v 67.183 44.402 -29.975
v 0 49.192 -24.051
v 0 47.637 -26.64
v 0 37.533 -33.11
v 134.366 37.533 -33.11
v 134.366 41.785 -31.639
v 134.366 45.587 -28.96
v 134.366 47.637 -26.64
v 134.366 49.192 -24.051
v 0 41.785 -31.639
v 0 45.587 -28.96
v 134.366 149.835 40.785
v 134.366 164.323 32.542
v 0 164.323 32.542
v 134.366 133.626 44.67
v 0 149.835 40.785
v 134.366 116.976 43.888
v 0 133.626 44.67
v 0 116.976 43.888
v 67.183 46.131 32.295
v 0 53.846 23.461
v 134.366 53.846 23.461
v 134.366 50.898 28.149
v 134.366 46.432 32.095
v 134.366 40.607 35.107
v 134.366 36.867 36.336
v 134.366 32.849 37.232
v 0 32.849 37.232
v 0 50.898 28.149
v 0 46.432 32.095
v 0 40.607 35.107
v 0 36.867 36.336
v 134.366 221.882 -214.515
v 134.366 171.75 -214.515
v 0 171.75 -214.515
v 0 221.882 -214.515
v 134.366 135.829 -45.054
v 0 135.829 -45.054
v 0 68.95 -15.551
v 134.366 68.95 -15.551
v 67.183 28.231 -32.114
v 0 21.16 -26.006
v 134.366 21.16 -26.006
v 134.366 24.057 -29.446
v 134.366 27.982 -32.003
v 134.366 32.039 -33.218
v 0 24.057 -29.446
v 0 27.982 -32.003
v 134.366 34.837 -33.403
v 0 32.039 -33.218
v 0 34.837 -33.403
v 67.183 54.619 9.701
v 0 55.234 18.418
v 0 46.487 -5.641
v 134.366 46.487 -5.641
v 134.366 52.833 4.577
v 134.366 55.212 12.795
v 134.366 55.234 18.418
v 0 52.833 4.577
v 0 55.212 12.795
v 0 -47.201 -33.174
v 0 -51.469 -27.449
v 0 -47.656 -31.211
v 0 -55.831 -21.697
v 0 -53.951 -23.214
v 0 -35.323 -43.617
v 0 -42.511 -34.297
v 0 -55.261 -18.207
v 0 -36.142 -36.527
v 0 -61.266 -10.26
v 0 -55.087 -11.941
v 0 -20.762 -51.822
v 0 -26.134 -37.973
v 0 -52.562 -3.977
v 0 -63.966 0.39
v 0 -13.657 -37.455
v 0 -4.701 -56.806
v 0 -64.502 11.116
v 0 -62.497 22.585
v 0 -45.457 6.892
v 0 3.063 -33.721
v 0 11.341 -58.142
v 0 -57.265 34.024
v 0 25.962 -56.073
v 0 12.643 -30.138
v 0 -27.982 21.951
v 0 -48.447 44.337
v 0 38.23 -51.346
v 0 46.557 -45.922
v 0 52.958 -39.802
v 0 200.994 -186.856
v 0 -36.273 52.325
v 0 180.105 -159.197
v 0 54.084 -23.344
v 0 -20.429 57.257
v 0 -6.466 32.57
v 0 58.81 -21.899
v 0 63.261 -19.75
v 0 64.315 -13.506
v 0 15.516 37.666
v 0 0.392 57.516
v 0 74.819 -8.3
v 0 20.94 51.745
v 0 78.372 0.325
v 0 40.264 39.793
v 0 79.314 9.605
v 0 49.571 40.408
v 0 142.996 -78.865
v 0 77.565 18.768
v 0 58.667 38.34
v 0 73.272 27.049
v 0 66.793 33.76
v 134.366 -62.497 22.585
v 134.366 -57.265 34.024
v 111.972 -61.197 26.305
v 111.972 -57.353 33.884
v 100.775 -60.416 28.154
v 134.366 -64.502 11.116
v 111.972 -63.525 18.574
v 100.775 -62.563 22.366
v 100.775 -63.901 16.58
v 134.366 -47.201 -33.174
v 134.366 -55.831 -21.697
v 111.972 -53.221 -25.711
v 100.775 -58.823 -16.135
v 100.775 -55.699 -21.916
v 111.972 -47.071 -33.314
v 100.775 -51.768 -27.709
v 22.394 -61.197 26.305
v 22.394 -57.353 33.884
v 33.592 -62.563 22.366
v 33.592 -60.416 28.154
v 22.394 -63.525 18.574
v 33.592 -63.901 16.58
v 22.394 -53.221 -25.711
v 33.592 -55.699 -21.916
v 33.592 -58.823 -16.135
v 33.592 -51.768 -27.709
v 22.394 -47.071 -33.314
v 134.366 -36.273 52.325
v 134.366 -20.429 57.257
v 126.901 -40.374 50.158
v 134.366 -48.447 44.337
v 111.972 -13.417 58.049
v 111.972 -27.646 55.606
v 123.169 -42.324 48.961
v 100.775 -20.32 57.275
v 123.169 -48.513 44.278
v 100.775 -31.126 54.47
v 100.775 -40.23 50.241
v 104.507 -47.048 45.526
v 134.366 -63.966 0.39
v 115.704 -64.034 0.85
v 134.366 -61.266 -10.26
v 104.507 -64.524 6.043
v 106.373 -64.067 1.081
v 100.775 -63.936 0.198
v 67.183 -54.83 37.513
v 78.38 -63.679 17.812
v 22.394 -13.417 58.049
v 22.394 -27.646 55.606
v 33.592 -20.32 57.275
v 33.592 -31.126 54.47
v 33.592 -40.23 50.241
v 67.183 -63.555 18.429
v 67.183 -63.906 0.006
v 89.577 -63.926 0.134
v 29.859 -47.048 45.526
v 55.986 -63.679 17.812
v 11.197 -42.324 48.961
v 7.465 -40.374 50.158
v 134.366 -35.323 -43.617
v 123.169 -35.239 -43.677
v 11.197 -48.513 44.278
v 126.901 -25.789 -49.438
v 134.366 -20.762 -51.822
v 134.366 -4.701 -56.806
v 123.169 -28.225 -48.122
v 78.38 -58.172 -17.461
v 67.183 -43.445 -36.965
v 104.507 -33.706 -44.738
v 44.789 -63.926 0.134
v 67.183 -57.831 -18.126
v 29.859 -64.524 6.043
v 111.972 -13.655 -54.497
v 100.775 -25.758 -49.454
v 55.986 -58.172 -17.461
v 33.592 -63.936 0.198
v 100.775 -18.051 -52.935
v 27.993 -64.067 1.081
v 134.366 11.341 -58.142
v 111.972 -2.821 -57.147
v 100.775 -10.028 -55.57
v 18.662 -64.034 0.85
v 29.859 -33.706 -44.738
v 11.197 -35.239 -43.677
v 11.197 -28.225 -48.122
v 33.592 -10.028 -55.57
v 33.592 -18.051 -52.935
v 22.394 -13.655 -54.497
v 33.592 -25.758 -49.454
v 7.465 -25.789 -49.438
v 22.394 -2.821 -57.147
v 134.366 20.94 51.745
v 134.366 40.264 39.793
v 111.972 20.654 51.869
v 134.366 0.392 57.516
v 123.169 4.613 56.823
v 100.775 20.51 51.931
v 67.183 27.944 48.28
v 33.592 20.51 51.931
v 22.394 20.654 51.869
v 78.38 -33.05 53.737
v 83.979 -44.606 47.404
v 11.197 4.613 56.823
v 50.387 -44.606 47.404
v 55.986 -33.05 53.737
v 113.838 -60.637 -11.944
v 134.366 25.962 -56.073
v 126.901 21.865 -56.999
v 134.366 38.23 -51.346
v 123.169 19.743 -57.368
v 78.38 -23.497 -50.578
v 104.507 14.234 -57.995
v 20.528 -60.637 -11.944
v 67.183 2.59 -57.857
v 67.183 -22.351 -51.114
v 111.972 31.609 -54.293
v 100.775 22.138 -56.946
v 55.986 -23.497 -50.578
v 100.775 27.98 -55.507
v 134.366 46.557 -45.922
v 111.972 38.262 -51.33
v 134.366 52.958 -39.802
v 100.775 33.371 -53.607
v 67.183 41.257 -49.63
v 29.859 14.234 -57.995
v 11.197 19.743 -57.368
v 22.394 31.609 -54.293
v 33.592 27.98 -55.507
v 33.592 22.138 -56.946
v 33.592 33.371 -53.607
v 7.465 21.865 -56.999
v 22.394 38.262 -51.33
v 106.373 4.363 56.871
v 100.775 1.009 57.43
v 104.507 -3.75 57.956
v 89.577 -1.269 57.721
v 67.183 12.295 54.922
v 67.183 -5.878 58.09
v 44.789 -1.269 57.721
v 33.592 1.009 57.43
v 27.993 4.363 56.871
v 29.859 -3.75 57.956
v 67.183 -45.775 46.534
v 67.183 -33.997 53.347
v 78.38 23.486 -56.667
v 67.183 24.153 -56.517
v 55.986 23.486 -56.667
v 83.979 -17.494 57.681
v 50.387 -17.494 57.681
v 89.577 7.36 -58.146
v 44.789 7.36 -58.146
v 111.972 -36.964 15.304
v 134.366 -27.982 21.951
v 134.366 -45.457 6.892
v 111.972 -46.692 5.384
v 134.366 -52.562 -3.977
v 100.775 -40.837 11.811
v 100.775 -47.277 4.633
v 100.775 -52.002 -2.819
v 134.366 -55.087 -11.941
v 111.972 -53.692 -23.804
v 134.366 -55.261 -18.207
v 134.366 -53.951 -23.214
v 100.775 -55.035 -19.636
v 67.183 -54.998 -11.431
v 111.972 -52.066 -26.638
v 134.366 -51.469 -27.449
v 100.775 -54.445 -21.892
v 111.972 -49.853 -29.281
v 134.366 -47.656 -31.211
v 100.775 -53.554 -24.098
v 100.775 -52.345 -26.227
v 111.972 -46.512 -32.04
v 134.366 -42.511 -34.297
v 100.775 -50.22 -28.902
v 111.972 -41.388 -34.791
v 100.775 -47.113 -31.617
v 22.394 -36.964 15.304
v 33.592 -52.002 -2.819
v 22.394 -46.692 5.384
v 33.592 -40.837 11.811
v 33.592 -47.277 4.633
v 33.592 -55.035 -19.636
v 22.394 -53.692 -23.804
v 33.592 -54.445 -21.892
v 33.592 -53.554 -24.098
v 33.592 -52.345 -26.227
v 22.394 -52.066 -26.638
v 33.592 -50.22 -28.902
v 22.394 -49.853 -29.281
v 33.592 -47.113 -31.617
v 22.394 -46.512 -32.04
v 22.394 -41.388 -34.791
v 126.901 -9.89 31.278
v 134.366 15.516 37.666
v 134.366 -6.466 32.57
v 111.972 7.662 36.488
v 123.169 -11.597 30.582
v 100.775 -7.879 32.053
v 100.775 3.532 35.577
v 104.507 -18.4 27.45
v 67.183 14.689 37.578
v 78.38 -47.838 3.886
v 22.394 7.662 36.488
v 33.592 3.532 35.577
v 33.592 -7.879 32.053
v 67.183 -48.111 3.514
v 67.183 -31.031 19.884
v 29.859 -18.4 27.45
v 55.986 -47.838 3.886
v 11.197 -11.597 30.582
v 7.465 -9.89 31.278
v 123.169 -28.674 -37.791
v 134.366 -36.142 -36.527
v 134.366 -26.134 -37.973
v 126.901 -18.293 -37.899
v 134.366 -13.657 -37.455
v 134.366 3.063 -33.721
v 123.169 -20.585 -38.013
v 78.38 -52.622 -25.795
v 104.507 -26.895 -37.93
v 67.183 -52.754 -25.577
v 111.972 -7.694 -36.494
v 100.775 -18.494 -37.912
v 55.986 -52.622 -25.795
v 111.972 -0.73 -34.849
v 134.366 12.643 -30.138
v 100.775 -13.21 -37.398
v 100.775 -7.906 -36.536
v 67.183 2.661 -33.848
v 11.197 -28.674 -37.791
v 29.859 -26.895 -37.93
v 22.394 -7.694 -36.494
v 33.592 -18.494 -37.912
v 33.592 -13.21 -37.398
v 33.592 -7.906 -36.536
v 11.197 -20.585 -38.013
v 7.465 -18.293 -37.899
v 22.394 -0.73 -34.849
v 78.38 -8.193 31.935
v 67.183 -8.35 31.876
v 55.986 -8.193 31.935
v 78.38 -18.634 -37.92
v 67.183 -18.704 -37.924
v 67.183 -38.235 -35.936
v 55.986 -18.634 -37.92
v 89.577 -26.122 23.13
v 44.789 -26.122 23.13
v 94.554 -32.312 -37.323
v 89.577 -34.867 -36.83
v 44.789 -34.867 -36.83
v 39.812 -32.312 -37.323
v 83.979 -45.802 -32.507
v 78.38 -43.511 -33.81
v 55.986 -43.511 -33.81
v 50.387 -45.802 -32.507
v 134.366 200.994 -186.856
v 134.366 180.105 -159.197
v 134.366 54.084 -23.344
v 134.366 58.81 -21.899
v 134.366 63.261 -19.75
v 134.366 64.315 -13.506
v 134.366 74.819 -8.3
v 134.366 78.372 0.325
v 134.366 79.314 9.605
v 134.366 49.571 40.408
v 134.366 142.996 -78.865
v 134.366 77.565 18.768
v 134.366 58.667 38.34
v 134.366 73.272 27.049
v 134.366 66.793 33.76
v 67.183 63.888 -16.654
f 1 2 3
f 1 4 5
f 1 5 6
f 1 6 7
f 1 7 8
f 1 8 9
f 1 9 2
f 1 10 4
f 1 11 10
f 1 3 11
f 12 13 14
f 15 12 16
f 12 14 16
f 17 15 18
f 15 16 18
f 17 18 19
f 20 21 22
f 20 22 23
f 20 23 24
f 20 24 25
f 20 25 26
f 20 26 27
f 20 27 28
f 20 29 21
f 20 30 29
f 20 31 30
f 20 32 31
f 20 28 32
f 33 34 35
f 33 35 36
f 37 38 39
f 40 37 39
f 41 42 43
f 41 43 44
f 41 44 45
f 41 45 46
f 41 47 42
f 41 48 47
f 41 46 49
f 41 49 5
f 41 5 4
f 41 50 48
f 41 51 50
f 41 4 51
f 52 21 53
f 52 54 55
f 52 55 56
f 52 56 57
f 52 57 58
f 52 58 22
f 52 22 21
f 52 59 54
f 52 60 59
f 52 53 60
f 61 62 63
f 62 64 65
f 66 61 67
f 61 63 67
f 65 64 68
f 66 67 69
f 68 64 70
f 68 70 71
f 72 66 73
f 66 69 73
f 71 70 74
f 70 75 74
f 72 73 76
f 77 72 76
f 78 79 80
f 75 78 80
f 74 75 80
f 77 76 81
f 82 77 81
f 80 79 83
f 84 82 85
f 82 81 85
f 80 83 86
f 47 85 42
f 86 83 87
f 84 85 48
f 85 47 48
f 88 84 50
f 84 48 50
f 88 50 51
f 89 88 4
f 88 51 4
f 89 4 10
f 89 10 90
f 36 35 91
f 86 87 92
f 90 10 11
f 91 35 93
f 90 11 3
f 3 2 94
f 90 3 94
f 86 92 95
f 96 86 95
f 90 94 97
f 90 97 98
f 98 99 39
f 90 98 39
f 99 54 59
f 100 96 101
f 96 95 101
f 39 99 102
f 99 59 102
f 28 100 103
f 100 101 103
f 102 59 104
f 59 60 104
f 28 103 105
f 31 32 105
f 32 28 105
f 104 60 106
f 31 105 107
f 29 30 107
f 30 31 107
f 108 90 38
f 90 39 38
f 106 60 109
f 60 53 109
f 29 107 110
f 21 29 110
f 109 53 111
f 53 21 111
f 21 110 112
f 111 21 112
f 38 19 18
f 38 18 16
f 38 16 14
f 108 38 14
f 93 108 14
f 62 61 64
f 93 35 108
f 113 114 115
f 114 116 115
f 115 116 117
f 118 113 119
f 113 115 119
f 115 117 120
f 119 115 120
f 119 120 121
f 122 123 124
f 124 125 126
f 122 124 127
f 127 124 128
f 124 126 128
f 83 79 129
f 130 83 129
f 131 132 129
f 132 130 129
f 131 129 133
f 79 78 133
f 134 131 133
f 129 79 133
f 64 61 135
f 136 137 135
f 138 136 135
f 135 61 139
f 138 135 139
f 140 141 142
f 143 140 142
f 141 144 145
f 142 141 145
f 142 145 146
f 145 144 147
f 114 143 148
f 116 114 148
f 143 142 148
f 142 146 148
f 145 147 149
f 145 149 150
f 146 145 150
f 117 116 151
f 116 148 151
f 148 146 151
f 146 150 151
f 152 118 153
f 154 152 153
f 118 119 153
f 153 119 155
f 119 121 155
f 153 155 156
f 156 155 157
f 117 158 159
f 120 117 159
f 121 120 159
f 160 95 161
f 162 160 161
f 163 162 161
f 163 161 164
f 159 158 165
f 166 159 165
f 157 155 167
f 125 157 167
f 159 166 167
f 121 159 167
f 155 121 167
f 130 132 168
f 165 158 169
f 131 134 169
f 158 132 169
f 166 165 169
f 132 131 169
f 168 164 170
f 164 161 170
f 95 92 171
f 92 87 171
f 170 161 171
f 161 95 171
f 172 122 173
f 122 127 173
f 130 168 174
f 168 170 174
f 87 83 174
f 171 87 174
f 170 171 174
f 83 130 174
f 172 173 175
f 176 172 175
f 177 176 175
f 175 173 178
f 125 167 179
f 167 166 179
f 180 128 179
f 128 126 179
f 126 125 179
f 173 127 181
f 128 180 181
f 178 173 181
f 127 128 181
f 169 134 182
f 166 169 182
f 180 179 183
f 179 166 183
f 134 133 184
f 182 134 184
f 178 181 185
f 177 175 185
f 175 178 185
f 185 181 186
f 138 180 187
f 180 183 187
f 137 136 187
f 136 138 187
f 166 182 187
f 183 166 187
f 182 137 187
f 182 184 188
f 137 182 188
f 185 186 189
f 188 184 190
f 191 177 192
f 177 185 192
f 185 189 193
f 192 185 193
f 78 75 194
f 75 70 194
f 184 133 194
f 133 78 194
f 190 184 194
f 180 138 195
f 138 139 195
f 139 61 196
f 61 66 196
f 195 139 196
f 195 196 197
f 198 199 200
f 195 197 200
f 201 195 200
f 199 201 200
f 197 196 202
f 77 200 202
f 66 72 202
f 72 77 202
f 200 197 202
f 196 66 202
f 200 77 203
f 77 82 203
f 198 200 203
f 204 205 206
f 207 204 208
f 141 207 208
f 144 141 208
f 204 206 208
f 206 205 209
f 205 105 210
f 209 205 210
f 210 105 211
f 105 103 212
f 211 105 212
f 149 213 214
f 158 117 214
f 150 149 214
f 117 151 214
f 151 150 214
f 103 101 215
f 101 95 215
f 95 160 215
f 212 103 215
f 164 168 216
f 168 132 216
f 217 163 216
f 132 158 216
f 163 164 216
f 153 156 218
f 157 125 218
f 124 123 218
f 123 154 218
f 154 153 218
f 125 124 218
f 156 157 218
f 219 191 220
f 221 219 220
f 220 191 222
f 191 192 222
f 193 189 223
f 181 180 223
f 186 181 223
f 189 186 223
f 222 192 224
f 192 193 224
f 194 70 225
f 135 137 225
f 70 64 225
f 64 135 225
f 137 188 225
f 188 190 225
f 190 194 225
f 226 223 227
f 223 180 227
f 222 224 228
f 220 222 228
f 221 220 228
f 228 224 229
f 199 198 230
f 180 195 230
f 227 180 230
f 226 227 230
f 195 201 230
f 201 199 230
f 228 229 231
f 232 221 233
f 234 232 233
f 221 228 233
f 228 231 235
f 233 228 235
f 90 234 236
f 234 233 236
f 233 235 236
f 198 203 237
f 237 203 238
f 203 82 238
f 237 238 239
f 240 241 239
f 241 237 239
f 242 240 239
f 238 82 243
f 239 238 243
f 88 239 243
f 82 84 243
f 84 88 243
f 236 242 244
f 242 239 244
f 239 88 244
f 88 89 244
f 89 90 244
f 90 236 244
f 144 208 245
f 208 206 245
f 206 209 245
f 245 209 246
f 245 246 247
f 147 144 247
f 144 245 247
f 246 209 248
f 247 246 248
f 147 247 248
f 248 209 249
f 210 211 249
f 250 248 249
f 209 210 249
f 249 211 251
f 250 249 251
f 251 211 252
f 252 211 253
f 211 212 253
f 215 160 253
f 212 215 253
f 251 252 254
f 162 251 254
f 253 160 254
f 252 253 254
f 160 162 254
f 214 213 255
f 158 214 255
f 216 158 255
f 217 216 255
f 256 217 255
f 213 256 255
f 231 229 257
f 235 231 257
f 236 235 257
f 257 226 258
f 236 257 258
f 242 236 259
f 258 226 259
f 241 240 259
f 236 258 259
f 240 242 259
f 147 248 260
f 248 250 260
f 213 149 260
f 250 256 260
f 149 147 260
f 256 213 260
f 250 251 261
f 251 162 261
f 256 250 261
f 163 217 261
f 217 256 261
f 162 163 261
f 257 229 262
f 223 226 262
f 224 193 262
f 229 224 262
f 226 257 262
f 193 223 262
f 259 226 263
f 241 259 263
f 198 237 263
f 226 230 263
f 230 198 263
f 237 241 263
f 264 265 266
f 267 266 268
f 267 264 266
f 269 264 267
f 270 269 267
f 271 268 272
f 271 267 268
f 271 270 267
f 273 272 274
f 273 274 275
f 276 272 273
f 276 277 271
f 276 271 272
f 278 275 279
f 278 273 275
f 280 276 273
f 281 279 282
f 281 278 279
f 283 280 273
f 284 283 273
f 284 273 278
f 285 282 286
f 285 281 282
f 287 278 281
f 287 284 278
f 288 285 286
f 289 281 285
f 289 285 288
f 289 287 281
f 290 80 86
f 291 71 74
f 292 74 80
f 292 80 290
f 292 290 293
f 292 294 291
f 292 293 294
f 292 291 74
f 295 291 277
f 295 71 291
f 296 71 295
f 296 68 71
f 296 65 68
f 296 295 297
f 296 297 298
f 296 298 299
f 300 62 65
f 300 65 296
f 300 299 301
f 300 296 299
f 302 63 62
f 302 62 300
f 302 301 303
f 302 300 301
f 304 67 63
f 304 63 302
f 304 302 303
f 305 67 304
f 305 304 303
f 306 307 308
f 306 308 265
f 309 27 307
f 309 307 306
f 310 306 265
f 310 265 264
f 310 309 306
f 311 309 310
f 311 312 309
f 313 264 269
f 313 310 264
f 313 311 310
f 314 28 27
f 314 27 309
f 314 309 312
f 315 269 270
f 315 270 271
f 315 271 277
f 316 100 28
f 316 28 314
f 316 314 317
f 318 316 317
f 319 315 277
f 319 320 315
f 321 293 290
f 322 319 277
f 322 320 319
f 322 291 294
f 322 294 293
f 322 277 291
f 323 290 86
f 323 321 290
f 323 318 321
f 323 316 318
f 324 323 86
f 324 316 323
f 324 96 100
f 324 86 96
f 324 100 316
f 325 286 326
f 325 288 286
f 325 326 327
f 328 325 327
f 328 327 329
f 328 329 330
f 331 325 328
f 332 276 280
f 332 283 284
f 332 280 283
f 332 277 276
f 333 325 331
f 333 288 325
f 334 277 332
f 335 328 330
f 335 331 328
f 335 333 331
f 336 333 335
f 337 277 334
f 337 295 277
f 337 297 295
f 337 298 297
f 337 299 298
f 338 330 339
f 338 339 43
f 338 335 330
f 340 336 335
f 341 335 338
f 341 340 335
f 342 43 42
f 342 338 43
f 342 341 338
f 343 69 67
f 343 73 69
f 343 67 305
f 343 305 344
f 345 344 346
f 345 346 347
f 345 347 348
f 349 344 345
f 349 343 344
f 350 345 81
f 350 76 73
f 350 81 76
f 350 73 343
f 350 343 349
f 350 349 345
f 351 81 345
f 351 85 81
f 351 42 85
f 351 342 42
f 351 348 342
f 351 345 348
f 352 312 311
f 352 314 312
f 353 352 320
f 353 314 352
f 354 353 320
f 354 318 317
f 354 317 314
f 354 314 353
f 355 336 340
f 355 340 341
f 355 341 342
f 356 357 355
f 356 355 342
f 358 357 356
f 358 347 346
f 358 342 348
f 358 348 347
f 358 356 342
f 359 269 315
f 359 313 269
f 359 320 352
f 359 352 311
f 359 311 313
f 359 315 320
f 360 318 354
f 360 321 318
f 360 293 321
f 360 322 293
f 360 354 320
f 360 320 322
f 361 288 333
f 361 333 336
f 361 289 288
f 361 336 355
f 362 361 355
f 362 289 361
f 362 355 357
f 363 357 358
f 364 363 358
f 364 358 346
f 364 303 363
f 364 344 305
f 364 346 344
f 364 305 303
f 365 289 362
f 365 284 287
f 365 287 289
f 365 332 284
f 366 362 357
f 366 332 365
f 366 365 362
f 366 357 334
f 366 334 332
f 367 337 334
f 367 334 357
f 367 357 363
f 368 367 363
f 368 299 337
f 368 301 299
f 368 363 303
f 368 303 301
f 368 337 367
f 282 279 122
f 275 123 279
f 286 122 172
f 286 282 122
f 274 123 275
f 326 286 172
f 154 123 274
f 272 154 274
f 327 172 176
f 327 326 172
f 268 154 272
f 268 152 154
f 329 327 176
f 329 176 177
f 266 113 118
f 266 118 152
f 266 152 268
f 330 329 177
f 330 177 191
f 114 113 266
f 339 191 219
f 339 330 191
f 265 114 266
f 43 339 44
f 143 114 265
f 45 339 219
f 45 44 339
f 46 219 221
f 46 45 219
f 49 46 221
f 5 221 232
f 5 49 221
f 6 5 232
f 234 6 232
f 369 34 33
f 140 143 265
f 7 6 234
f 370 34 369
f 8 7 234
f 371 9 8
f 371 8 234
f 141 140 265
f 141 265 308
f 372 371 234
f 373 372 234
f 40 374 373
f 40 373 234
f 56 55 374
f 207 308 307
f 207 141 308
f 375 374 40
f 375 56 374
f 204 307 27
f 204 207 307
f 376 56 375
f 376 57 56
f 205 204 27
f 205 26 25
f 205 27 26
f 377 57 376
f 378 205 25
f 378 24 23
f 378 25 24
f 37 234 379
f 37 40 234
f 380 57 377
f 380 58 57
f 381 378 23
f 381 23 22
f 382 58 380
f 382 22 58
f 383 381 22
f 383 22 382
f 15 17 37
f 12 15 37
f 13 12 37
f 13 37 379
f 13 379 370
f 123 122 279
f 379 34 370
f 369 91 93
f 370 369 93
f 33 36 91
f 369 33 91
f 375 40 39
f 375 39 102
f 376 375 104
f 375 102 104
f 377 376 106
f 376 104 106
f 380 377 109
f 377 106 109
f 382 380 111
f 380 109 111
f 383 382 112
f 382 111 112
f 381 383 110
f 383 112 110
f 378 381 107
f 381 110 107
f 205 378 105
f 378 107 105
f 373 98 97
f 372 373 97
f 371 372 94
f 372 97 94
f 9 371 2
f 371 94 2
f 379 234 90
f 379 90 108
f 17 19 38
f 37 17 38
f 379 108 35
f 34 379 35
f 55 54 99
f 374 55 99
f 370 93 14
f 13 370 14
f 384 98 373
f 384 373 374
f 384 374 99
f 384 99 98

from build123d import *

# Parameters (mm, degrees)
F1_DEPTH = 134.366


with BuildPart() as f1:
    # F0 (on Right) → F1 (new body)
    with BuildSketch(Plane.YZ):
        with BuildLine():
            add(Edge.make_bspline(
                [(52.9576185242, -39.8017066897), (56.7917955179, -35.3999449299), (59.4162233174, -30.2441120148)],
                knots=[6.0764123097, 6.0764123097, 6.0764123097, 6.2831853072, 6.2831853072, 6.2831853072], degree=2, weights=[1, 0.9946603747, 1]))
            add(Edge.make_bspline(
                [(59.4162233174, -30.2441120148), (61.9584410831, -25.2497852376), (63.2614291599, -19.7504379506)],
                knots=[0, 0, 0, 0.2003397789, 0.2003397789, 0.2003397789], degree=2, weights=[1, 0.9949871903, 1]))
            ThreePointArc((63.2614291599, -19.7504379506), (56.4747551576, -22.7119475449), (49.1921255016, -24.0508980233))
            add(Edge.make_bspline(
                [(37.5332238168, -33.1098520281), (45.5664758872, -31.5379746925), (49.1921255016, -24.0508980233)],
                knots=[3.7738251561, 3.7738251561, 3.7738251561, 4.7123889804, 4.7123889804, 4.7123889804], degree=2, weights=[1, 0.8918932704, 1]))
            Line((37.5332238168, -33.1098520281), (52.9576185242, -39.8017066897))
        make_face()
        with BuildLine():
            add(Edge.make_bspline(
                [(59.4162233174, -30.2441120148), (61.9584410831, -25.2497852376), (63.2614291599, -19.7504379506)],
                knots=[0, 0, 0, 0.2003397789, 0.2003397789, 0.2003397789], degree=2, weights=[1, 0.9949871903, 1]))
            add(Edge.make_bspline(
                [(52.9576185242, -39.8017066897), (56.7917955179, -35.3999449299), (59.4162233174, -30.2441120148)],
                knots=[6.0764123097, 6.0764123097, 6.0764123097, 6.2831853072, 6.2831853072, 6.2831853072], degree=2, weights=[1, 0.9946603747, 1]))
            Line((52.9576185242, -39.8017066897), (142.9959279396, -78.8647164227))
            Line((142.9959279396, -78.8647164227), (135.8290441256, -45.0542887336))
            Line((135.8290441256, -45.0542887336), (68.9503520739, -15.5508760084))
            ThreePointArc((68.9503520739, -15.5508760084), (66.2210997632, -17.8067246745), (63.2614291599, -19.7504379506))
        make_face()
        with BuildLine():
            add(Edge.make_bspline(
                [(63.2614291599, -19.7504379506), (63.9888115577, -16.6804724711), (64.3145880563, -13.5058171875)],
                knots=[0.2003397789, 0.2003397789, 0.2003397789, 0.3124358581, 0.3124358581, 0.3124358581], degree=2, weights=[1, 0.9984297198, 1]))
            ThreePointArc((63.2614291599, -19.7504379506), (66.2210997632, -17.8067246745), (68.9503520739, -15.5508760084))
            Line((68.9503520739, -15.5508760084), (64.3145880563, -13.5058171875))
        make_face()
        with BuildLine():
            add(Edge.make_bspline(
                [(40.2635959663, 39.7926981892), (-87.3580346383, 147.0542081255), (-63.9062474873, 0.0061756271), (-40.4544603363, -147.0418568712), (52.9576185242, -39.8017066897)],
                knots=[1.300050122, 1.300050122, 1.300050122, 3.6882312159, 3.6882312159, 6.0764123097, 6.0764123097, 6.0764123097], degree=2, weights=[1, 0.3678592366, 1, 0.3678592366, 1]))
            Line((52.9576185242, -39.8017066897), (37.5332238168, -33.1098520281))
            add(Edge.make_bspline(
                [(21.1596586547, -26.0062009329), (26.8882127983, -35.192775782), (37.5332238168, -33.1098520281)],
                knots=[2.5905659748, 2.5905659748, 2.5905659748, 3.7738251561, 3.7738251561, 3.7738251561], degree=2, weights=[1, 0.8300329355, 1]))
            add(Edge.make_bspline(
                [(32.8487050816, 37.231628143), (-43.515539881, 50.6889506683), (-54.9979758387, -11.4311142158), (-66.4804117964, -73.5511790999), (21.1596586547, -26.0062009329)],
                knots=[0.6983315591, 0.6983315591, 0.6983315591, 2.7823688311, 2.7823688311, 4.8664061031, 4.8664061031, 4.8664061031], degree=2, weights=[1, 0.5044783468, 1, 0.5044783468, 1]))
            ThreePointArc((32.8487050816, 37.231628143), (36.4781496781, 38.7379936783), (40.2635959663, 39.7926981892))
        make_face()
        with BuildLine():
            Line((46.4871147638, -5.6412599382), (64.3145880563, -13.5058171875))
            add(Edge.make_bspline(
                [(64.3145880563, -13.5058171875), (67.4400861974, 16.9518101426), (40.2635959663, 39.7926981892)],
                knots=[0.3124358581, 0.3124358581, 0.3124358581, 1.300050122, 1.300050122, 1.300050122], degree=2, weights=[1, 0.8805347337, 1]))
            ThreePointArc((40.2635959663, 39.7926981892), (36.4781496781, 38.7379936783), (32.8487050816, 37.231628143))
            add(Edge.make_bspline(
                [(53.8459569216, 23.4609879553), (49.0933112893, 34.3689152969), (32.8487050816, 37.231628143)],
                knots=[0, 0, 0, 0.6983315591, 0.6983315591, 0.6983315591], degree=2, weights=[1, 0.9396584383, 1]))
            add(Edge.make_bspline(
                [(46.4871147638, -5.6412599382), (59.4663117422, 10.5615574568), (53.8459569216, 23.4609879553)],
                knots=[5.4700516742, 5.4700516742, 5.4700516742, 6.2831853072, 6.2831853072, 6.2831853072], degree=2, weights=[1, 0.9184839142, 1]))
        make_face()
        with BuildLine():
            add(Edge.make_bspline(
                [(64.3145880563, -13.5058171875), (67.4400861974, 16.9518101426), (40.2635959663, 39.7926981892)],
                knots=[0.3124358581, 0.3124358581, 0.3124358581, 1.300050122, 1.300050122, 1.300050122], degree=2, weights=[1, 0.8805347337, 1]))
            Line((64.3145880563, -13.5058171875), (68.9503520739, -15.5508760084))
            ThreePointArc((68.9503520739, -15.5508760084), (75.719196821, 23.0642083956), (40.2635959663, 39.7926981892))
        make_face()
        Polygon((135.8290441256, -45.0542887336), (142.9959279396, -78.8647164227), (174.6225650901, -92.5858940287), (172.0244634354, -61.0218317866), align=None)
        Polygon((174.6225650901, -92.5858940287), (142.9959279396, -78.8647164227), (171.7500537634, -214.5149260759), (221.8824923038, -214.5149260759), (200.9939625859, -186.8558004498), (180.105432868, -159.1966748238), align=None)
        with BuildLine():
            Line((116.9757023454, 43.8880696893), (135.8290441256, -45.0542887336))
            Line((135.8290441256, -45.0542887336), (172.0244634354, -61.0218317866))
            Line((172.0244634354, -61.0218317866), (164.3230021, 32.5424075127))
            ThreePointArc((164.3230021, 32.5424075127), (141.8677963571, 43.300004811), (116.9757023454, 43.8880696893))
        make_face()
    extrude(amount=F1_DEPTH)


solid = f1.part
